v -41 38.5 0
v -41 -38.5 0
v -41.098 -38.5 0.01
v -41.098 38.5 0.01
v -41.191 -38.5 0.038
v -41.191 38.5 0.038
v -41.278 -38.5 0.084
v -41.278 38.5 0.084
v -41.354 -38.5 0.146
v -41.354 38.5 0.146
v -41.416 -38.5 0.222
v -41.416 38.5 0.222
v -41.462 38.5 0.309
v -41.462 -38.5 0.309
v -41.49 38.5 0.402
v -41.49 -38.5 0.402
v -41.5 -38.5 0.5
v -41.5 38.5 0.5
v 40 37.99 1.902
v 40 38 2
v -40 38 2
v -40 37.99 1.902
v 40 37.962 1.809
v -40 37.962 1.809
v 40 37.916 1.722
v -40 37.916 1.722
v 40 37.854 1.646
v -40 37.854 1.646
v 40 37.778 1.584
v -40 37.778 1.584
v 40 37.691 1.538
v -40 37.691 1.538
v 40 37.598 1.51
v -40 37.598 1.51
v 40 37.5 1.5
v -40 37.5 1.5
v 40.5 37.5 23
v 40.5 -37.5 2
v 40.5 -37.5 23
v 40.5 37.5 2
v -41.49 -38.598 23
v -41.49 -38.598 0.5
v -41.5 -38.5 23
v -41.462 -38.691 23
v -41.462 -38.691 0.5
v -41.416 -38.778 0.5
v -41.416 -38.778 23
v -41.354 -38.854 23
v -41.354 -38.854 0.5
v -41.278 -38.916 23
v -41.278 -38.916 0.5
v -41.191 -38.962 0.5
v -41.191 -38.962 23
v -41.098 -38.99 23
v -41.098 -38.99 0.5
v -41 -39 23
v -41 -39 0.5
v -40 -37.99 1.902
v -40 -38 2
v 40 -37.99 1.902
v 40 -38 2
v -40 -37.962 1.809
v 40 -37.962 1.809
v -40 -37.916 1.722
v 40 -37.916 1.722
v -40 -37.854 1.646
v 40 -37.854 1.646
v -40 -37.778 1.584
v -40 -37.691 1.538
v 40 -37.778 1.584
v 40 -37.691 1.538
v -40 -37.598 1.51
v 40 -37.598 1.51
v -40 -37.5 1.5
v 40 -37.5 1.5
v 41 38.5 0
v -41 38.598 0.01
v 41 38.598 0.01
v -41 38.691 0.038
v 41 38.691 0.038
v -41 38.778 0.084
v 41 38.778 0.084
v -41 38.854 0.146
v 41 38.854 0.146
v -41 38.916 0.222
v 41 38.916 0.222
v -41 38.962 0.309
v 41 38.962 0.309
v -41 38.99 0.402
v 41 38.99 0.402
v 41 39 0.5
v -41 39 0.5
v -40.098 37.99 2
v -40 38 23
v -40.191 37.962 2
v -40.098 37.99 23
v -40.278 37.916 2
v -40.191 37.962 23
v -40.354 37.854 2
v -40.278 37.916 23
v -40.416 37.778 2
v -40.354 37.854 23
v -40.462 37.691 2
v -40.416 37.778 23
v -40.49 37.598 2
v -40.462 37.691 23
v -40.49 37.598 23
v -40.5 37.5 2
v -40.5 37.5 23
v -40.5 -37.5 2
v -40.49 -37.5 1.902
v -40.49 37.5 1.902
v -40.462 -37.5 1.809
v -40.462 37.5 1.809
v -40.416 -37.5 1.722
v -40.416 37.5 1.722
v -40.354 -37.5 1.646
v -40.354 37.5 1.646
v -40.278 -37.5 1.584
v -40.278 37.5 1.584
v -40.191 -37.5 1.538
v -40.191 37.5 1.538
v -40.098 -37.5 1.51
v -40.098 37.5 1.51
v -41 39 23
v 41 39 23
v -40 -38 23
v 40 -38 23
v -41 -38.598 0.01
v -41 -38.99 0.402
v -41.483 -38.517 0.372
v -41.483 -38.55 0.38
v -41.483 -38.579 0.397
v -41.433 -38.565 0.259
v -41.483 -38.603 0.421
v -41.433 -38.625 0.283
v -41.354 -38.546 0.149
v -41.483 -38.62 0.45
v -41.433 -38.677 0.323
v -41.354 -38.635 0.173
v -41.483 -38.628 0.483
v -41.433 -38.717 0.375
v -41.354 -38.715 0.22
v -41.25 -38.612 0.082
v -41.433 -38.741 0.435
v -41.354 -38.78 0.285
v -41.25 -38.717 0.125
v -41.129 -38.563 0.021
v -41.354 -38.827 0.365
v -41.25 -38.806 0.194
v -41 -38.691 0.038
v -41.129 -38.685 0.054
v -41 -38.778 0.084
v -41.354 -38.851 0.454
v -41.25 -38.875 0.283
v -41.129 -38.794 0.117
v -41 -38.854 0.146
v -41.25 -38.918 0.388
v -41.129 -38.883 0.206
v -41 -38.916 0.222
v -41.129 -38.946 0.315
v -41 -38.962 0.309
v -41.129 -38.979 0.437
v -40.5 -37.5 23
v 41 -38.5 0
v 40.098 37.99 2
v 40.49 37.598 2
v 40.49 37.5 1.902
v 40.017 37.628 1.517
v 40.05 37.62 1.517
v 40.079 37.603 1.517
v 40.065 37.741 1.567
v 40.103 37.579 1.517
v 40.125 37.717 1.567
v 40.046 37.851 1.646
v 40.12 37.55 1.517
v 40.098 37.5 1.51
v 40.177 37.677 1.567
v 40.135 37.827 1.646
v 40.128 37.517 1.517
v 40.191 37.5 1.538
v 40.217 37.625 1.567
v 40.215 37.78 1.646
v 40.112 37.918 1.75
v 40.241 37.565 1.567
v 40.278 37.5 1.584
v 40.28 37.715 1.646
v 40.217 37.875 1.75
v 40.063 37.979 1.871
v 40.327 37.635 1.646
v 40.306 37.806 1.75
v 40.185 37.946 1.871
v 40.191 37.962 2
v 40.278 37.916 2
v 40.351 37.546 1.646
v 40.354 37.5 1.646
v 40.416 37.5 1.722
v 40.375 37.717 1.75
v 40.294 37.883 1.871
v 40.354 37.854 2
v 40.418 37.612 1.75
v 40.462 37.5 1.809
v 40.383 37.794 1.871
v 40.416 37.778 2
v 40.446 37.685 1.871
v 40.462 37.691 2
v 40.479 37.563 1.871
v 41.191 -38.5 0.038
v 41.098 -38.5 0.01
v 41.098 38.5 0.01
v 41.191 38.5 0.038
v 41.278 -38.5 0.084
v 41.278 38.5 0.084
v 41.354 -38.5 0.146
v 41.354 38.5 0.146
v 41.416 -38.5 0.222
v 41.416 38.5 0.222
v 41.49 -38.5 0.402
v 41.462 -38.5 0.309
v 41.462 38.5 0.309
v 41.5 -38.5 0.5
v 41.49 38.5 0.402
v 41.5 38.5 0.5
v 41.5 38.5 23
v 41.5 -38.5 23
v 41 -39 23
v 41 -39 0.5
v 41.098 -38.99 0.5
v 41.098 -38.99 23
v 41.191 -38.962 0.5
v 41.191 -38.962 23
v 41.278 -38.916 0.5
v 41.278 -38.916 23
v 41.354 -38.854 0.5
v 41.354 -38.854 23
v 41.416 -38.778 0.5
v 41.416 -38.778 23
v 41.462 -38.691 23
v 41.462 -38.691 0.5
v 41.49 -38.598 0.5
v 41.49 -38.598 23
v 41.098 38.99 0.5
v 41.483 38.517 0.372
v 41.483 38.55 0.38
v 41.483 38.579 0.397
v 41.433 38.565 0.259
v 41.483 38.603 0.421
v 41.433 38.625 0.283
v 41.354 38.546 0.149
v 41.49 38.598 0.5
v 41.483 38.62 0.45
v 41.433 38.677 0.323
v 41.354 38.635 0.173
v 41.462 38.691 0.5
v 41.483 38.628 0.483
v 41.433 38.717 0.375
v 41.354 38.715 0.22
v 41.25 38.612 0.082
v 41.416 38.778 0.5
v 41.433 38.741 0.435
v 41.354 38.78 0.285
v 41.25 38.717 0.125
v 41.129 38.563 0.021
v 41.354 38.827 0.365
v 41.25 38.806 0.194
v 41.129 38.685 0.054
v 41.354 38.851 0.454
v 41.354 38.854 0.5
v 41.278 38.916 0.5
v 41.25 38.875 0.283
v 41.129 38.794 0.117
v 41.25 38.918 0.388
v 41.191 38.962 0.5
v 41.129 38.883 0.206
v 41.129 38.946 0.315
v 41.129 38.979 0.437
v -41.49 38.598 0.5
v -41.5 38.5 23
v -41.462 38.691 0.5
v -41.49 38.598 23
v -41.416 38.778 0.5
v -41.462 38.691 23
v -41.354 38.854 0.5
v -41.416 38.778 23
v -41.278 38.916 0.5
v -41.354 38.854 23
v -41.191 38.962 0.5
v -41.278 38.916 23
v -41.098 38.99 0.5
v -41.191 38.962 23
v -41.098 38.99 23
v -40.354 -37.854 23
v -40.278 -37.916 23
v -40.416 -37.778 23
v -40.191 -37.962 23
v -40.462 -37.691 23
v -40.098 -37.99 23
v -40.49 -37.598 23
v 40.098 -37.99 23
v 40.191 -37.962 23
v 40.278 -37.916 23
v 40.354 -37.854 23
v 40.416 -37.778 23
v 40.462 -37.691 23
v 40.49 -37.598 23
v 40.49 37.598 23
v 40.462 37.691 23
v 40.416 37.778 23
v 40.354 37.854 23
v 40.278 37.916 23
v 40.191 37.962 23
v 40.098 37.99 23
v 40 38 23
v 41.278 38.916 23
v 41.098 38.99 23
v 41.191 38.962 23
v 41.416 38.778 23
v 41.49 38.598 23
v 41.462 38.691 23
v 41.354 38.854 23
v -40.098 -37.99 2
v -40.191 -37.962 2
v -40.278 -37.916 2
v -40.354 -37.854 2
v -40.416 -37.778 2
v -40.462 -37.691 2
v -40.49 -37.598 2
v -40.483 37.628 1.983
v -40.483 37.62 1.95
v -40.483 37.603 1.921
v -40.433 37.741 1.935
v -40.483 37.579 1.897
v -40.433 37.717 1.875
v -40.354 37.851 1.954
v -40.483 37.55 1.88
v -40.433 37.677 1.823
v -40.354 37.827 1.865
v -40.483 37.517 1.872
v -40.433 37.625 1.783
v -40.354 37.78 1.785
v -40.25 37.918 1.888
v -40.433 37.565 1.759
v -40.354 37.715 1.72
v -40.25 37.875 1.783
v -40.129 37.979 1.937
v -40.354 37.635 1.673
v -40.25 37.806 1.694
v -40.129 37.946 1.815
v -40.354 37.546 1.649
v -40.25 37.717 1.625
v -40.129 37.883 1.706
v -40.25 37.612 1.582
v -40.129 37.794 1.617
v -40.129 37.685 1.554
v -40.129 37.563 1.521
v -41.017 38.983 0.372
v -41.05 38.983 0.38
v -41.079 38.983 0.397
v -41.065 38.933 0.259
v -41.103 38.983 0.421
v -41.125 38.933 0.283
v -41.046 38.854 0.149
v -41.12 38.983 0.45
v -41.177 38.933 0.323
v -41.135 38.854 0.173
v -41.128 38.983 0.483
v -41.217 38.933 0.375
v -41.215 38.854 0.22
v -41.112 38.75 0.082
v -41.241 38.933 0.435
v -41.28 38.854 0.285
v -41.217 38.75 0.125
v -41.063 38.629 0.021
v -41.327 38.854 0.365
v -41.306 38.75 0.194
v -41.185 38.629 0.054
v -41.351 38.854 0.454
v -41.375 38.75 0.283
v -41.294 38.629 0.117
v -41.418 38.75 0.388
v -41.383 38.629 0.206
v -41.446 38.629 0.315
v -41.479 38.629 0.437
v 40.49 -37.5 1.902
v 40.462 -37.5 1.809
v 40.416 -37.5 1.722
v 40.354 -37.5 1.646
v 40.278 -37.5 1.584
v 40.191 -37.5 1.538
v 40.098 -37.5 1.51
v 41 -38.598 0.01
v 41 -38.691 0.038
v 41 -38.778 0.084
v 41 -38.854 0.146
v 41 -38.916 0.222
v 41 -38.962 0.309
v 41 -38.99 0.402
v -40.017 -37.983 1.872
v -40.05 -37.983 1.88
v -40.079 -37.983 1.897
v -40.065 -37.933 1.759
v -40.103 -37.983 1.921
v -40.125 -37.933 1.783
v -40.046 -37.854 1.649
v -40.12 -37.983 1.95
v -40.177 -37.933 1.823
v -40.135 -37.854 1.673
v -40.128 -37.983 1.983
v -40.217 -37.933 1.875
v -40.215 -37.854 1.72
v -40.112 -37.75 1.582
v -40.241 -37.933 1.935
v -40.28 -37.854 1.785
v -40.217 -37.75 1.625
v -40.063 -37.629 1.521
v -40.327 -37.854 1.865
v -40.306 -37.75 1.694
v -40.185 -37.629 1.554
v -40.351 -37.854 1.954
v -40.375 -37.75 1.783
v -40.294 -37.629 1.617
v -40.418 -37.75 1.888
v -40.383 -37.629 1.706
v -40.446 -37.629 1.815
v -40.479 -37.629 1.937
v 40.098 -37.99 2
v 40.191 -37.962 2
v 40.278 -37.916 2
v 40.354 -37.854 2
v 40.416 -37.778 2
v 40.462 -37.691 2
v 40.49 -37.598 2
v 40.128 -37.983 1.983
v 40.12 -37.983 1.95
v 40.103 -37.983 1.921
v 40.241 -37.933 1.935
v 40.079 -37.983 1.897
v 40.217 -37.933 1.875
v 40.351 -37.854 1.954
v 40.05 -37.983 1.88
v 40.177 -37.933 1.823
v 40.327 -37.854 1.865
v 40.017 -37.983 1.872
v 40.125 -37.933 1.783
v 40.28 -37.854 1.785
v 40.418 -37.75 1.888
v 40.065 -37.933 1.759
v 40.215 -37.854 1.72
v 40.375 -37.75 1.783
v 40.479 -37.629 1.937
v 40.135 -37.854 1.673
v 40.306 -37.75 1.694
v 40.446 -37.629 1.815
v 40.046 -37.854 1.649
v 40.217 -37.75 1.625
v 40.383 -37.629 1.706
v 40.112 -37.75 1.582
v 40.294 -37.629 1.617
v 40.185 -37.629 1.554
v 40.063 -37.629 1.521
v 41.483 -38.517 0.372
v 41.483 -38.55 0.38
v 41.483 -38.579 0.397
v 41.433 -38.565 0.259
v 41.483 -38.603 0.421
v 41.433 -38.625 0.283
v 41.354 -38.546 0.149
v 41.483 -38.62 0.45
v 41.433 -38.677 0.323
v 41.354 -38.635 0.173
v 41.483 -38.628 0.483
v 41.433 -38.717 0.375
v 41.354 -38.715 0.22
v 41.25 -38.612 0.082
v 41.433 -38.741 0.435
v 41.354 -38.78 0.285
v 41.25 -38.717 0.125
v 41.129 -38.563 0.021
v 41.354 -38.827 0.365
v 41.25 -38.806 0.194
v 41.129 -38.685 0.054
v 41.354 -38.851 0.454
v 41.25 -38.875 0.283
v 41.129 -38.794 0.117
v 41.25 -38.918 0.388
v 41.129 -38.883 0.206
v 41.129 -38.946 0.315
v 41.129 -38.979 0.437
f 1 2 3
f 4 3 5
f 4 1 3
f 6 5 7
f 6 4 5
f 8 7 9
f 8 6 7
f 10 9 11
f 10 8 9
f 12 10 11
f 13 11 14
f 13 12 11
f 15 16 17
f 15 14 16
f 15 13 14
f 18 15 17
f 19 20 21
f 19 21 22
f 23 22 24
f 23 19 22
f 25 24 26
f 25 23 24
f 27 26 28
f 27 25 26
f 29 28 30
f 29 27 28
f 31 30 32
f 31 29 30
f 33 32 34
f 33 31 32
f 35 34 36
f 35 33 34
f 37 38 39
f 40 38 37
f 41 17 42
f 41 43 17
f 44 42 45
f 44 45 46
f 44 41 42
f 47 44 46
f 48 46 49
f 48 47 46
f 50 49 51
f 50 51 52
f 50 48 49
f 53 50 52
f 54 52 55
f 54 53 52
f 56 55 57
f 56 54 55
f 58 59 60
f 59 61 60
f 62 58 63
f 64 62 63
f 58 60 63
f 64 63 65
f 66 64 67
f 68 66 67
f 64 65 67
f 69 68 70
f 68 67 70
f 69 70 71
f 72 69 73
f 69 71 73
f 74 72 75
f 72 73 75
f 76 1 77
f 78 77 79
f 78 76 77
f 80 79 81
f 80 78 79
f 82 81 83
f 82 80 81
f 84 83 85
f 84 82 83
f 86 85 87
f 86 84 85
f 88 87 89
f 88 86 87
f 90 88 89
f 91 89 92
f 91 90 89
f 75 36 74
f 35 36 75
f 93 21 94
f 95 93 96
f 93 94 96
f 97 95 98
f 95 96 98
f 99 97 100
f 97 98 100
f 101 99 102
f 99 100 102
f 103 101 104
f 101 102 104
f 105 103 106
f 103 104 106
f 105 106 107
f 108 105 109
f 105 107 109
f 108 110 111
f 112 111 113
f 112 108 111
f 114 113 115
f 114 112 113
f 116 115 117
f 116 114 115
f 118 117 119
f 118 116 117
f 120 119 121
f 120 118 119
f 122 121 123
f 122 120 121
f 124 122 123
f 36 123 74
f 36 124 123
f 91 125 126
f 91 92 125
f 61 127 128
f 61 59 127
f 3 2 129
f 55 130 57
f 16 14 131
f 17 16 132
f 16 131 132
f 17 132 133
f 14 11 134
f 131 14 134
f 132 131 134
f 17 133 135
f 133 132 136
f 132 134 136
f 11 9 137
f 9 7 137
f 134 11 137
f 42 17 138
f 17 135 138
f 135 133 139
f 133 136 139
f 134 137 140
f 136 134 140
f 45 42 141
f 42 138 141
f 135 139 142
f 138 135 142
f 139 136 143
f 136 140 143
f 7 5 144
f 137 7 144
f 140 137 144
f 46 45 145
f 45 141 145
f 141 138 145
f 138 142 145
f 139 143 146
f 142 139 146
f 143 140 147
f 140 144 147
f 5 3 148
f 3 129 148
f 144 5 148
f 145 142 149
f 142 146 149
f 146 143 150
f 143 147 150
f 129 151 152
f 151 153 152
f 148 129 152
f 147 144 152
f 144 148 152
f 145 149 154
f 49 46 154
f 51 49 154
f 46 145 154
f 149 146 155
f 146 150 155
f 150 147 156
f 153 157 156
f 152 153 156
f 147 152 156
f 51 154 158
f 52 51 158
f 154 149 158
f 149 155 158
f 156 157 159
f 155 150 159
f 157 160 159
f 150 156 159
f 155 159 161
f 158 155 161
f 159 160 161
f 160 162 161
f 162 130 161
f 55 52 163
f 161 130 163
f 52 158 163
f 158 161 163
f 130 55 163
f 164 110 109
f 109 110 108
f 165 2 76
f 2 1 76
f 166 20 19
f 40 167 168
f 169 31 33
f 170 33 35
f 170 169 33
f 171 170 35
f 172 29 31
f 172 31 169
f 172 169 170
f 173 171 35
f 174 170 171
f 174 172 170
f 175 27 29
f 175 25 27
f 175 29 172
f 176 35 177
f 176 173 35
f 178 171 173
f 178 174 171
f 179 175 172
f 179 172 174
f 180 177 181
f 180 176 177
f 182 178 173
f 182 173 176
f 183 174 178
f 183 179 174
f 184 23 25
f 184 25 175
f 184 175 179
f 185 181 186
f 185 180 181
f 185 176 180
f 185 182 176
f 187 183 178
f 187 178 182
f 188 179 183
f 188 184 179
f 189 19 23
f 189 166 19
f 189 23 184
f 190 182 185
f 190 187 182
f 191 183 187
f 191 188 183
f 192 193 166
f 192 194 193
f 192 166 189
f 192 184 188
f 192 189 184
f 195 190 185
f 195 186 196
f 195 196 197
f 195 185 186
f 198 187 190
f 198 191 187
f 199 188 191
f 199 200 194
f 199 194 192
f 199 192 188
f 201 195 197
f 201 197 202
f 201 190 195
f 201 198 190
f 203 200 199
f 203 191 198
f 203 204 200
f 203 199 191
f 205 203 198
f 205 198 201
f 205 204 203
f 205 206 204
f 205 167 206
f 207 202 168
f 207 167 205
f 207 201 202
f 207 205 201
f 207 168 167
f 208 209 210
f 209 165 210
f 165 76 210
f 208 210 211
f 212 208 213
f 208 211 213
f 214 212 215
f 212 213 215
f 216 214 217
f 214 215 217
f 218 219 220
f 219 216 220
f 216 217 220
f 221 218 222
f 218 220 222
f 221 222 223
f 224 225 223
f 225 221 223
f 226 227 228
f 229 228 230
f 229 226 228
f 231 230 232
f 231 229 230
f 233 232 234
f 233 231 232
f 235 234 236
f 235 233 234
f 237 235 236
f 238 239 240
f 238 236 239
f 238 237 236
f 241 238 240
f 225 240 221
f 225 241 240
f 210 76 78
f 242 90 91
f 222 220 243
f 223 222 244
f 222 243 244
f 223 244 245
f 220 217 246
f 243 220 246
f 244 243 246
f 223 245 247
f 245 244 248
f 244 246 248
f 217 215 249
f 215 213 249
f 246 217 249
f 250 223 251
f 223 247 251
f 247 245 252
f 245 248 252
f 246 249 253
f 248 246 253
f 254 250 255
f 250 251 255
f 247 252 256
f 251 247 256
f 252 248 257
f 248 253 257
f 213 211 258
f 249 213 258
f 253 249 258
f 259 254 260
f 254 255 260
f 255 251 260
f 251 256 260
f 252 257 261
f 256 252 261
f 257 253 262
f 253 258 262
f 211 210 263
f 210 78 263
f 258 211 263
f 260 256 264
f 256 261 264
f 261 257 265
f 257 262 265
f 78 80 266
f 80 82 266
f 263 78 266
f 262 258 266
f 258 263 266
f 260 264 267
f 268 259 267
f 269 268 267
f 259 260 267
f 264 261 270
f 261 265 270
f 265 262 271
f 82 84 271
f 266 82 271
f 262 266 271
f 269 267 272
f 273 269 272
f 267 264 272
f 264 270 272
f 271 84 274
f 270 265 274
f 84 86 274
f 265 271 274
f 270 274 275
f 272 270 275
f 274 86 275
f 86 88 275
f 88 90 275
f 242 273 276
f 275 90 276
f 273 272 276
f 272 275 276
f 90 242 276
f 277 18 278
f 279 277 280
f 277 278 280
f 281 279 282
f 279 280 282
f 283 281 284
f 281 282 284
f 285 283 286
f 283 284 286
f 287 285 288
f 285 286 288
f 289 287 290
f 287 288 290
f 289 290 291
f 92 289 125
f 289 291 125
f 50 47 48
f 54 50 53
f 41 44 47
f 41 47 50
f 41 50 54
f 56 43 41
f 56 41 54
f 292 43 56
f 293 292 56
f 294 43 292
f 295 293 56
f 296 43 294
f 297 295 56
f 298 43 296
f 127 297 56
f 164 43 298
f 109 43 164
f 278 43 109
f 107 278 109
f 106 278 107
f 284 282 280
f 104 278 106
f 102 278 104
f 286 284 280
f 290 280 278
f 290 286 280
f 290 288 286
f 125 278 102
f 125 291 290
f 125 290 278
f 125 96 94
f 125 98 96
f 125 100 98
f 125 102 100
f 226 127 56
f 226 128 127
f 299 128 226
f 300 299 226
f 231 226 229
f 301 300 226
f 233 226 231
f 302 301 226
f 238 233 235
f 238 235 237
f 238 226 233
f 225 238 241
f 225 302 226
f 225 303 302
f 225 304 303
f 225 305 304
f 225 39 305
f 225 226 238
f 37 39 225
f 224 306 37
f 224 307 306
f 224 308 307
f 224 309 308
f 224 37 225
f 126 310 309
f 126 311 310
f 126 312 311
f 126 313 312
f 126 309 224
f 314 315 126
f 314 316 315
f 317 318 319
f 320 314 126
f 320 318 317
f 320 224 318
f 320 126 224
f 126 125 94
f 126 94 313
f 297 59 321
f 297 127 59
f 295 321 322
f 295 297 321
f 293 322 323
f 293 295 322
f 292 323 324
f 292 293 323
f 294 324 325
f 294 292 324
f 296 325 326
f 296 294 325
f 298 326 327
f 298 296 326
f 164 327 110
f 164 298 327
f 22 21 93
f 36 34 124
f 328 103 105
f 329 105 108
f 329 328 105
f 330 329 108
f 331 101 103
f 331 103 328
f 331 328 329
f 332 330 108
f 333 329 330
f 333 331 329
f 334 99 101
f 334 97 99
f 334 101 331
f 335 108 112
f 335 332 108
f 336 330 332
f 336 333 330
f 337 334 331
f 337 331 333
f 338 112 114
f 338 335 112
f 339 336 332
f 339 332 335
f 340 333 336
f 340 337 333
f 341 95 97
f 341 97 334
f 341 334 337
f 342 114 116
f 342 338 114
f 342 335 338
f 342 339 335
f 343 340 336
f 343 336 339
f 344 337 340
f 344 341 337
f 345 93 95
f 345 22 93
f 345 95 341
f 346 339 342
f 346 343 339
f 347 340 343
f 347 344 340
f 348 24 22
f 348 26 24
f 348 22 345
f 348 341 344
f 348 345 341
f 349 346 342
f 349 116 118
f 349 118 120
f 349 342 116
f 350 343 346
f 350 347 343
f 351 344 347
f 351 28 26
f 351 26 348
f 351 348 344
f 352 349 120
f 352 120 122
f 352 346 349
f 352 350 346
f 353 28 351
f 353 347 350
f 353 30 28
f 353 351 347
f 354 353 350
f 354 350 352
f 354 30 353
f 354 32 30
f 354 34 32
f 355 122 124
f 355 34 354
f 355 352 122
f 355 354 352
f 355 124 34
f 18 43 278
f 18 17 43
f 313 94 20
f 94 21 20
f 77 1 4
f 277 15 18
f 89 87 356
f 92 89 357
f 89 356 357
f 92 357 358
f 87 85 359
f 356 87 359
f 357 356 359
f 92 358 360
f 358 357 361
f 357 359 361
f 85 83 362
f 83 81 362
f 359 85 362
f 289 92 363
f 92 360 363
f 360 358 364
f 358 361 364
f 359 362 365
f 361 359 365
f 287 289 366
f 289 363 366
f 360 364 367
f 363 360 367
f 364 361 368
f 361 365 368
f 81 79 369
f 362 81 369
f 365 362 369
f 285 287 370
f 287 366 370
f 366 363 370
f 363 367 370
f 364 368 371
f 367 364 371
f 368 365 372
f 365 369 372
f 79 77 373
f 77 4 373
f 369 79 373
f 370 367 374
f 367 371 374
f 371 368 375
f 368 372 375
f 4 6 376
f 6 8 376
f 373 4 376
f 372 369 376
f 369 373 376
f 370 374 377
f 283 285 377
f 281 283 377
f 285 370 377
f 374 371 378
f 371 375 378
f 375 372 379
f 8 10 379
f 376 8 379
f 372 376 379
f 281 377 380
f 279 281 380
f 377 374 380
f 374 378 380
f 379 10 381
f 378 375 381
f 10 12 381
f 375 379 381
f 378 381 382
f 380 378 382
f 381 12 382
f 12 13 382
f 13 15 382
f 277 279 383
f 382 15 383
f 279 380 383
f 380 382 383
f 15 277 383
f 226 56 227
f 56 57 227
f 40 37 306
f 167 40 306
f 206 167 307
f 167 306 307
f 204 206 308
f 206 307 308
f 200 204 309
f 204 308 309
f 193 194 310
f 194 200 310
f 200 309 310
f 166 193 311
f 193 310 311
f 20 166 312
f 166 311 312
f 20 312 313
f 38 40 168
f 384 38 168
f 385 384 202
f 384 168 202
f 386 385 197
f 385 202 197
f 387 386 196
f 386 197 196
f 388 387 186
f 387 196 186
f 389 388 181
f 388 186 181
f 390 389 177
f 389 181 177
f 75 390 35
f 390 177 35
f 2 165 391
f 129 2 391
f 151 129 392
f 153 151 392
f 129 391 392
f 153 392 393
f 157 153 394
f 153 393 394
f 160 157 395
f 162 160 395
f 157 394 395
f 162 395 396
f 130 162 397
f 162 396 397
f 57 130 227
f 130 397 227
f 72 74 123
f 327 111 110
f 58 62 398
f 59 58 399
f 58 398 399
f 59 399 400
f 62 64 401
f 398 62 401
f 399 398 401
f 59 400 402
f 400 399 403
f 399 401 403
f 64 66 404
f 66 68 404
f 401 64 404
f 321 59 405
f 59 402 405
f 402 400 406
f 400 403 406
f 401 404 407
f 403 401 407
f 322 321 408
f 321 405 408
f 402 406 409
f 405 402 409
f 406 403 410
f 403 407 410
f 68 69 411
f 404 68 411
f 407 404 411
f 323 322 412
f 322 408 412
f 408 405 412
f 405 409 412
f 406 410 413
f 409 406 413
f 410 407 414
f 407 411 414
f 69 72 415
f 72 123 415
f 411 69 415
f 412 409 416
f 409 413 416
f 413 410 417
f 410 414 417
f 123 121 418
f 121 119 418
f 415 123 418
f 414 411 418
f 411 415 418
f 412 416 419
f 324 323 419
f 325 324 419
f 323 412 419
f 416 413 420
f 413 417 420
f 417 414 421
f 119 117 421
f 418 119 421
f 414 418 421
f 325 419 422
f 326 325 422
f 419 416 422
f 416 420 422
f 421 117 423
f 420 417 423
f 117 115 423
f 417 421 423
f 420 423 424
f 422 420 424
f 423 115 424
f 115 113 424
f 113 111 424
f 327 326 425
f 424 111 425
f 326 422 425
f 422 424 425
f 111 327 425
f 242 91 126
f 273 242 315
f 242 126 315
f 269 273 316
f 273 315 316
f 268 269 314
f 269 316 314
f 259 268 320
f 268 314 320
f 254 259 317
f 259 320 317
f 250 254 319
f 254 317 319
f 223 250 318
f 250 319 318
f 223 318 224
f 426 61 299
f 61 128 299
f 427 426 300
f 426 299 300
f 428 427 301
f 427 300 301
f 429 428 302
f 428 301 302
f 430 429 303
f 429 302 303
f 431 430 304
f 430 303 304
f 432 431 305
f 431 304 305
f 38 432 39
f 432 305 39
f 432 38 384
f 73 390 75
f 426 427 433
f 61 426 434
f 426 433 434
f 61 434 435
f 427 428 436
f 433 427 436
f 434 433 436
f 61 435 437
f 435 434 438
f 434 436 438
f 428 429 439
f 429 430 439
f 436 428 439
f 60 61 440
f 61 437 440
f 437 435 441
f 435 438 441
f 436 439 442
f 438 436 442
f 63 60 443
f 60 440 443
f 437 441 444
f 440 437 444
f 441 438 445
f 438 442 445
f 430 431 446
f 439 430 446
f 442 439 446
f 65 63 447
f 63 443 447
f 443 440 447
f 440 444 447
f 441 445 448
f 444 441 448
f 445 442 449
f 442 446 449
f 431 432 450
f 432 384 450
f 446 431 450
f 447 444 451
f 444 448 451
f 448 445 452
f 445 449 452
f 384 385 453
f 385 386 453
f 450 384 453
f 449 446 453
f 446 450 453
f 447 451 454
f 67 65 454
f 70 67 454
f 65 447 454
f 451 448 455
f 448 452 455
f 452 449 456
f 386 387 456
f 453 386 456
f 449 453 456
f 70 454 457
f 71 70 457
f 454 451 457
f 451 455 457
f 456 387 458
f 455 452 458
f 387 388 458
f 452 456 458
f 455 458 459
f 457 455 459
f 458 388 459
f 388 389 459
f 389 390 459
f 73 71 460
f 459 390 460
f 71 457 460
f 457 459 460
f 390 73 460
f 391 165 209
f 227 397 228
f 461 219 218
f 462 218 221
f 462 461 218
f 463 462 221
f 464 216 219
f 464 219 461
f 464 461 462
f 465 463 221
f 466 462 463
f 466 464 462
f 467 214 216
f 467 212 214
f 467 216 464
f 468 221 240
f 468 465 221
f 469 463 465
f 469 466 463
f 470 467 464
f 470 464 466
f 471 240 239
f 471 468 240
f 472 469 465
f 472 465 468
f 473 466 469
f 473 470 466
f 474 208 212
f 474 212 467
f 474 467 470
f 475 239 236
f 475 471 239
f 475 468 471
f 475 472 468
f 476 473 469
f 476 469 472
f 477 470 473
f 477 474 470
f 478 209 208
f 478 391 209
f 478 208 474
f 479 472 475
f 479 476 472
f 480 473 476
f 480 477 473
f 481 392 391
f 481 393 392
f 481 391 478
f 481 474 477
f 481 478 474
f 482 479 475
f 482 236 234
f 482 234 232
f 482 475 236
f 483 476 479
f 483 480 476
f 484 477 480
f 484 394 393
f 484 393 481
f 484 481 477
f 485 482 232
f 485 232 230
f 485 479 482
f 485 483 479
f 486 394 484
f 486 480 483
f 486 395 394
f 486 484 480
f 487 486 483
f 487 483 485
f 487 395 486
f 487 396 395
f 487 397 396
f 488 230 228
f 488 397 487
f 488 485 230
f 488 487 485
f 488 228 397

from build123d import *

# Parameters (mm, degrees)
F0_W     = 83
F0_H     = 78
F0_W_2   = 81
F0_H_2   = 76
F1_DEPTH = 23
F2_DEPTH = 1.5
F3_R     = 0.5
F4_R     = 0.5


with BuildPart() as f1:
    # F0 (on Top) → F1 (new body)
    with BuildSketch(Plane.XY):
        Rectangle(F0_W, F0_H)
        Rectangle(F0_W_2, F0_H_2, mode=Mode.SUBTRACT)
    extrude(amount=F1_DEPTH)

    # F0 (on Top) → F2 (join)
    with BuildSketch(Plane.XY):
        Rectangle(F0_W_2, F0_H_2)
    extrude(amount=F2_DEPTH)

    # F3
    f3_edges = [f1.edges().sort_by_distance(p)[0] for p in [
        (0, -39, 0),
        (-41.5, 0, 0),
        (0, 39, 0),
        (41.5, 0, 0),
        (-41.5, -39, 11.5),
        (41.5, -39, 11.5),
        (-41.5, 39, 11.5),
        (41.5, 39, 11.5),
    ]]
    fillet(f3_edges, radius=F3_R)

    # F4
    f4_edges = [f1.edges().sort_by_distance(p)[0] for p in [
        (40.5, 38, 12.25),
        (0, 38, 1.5),
        (40.5, 0, 1.5),
        (-40.5, 38, 12.25),
        (-40.5, 0, 1.5),
        (40.5, -38, 12.25),
        (0, -38, 1.5),
        (-40.5, -38, 12.25),
    ]]
    fillet(f4_edges, radius=F4_R)


solid = f1.part
